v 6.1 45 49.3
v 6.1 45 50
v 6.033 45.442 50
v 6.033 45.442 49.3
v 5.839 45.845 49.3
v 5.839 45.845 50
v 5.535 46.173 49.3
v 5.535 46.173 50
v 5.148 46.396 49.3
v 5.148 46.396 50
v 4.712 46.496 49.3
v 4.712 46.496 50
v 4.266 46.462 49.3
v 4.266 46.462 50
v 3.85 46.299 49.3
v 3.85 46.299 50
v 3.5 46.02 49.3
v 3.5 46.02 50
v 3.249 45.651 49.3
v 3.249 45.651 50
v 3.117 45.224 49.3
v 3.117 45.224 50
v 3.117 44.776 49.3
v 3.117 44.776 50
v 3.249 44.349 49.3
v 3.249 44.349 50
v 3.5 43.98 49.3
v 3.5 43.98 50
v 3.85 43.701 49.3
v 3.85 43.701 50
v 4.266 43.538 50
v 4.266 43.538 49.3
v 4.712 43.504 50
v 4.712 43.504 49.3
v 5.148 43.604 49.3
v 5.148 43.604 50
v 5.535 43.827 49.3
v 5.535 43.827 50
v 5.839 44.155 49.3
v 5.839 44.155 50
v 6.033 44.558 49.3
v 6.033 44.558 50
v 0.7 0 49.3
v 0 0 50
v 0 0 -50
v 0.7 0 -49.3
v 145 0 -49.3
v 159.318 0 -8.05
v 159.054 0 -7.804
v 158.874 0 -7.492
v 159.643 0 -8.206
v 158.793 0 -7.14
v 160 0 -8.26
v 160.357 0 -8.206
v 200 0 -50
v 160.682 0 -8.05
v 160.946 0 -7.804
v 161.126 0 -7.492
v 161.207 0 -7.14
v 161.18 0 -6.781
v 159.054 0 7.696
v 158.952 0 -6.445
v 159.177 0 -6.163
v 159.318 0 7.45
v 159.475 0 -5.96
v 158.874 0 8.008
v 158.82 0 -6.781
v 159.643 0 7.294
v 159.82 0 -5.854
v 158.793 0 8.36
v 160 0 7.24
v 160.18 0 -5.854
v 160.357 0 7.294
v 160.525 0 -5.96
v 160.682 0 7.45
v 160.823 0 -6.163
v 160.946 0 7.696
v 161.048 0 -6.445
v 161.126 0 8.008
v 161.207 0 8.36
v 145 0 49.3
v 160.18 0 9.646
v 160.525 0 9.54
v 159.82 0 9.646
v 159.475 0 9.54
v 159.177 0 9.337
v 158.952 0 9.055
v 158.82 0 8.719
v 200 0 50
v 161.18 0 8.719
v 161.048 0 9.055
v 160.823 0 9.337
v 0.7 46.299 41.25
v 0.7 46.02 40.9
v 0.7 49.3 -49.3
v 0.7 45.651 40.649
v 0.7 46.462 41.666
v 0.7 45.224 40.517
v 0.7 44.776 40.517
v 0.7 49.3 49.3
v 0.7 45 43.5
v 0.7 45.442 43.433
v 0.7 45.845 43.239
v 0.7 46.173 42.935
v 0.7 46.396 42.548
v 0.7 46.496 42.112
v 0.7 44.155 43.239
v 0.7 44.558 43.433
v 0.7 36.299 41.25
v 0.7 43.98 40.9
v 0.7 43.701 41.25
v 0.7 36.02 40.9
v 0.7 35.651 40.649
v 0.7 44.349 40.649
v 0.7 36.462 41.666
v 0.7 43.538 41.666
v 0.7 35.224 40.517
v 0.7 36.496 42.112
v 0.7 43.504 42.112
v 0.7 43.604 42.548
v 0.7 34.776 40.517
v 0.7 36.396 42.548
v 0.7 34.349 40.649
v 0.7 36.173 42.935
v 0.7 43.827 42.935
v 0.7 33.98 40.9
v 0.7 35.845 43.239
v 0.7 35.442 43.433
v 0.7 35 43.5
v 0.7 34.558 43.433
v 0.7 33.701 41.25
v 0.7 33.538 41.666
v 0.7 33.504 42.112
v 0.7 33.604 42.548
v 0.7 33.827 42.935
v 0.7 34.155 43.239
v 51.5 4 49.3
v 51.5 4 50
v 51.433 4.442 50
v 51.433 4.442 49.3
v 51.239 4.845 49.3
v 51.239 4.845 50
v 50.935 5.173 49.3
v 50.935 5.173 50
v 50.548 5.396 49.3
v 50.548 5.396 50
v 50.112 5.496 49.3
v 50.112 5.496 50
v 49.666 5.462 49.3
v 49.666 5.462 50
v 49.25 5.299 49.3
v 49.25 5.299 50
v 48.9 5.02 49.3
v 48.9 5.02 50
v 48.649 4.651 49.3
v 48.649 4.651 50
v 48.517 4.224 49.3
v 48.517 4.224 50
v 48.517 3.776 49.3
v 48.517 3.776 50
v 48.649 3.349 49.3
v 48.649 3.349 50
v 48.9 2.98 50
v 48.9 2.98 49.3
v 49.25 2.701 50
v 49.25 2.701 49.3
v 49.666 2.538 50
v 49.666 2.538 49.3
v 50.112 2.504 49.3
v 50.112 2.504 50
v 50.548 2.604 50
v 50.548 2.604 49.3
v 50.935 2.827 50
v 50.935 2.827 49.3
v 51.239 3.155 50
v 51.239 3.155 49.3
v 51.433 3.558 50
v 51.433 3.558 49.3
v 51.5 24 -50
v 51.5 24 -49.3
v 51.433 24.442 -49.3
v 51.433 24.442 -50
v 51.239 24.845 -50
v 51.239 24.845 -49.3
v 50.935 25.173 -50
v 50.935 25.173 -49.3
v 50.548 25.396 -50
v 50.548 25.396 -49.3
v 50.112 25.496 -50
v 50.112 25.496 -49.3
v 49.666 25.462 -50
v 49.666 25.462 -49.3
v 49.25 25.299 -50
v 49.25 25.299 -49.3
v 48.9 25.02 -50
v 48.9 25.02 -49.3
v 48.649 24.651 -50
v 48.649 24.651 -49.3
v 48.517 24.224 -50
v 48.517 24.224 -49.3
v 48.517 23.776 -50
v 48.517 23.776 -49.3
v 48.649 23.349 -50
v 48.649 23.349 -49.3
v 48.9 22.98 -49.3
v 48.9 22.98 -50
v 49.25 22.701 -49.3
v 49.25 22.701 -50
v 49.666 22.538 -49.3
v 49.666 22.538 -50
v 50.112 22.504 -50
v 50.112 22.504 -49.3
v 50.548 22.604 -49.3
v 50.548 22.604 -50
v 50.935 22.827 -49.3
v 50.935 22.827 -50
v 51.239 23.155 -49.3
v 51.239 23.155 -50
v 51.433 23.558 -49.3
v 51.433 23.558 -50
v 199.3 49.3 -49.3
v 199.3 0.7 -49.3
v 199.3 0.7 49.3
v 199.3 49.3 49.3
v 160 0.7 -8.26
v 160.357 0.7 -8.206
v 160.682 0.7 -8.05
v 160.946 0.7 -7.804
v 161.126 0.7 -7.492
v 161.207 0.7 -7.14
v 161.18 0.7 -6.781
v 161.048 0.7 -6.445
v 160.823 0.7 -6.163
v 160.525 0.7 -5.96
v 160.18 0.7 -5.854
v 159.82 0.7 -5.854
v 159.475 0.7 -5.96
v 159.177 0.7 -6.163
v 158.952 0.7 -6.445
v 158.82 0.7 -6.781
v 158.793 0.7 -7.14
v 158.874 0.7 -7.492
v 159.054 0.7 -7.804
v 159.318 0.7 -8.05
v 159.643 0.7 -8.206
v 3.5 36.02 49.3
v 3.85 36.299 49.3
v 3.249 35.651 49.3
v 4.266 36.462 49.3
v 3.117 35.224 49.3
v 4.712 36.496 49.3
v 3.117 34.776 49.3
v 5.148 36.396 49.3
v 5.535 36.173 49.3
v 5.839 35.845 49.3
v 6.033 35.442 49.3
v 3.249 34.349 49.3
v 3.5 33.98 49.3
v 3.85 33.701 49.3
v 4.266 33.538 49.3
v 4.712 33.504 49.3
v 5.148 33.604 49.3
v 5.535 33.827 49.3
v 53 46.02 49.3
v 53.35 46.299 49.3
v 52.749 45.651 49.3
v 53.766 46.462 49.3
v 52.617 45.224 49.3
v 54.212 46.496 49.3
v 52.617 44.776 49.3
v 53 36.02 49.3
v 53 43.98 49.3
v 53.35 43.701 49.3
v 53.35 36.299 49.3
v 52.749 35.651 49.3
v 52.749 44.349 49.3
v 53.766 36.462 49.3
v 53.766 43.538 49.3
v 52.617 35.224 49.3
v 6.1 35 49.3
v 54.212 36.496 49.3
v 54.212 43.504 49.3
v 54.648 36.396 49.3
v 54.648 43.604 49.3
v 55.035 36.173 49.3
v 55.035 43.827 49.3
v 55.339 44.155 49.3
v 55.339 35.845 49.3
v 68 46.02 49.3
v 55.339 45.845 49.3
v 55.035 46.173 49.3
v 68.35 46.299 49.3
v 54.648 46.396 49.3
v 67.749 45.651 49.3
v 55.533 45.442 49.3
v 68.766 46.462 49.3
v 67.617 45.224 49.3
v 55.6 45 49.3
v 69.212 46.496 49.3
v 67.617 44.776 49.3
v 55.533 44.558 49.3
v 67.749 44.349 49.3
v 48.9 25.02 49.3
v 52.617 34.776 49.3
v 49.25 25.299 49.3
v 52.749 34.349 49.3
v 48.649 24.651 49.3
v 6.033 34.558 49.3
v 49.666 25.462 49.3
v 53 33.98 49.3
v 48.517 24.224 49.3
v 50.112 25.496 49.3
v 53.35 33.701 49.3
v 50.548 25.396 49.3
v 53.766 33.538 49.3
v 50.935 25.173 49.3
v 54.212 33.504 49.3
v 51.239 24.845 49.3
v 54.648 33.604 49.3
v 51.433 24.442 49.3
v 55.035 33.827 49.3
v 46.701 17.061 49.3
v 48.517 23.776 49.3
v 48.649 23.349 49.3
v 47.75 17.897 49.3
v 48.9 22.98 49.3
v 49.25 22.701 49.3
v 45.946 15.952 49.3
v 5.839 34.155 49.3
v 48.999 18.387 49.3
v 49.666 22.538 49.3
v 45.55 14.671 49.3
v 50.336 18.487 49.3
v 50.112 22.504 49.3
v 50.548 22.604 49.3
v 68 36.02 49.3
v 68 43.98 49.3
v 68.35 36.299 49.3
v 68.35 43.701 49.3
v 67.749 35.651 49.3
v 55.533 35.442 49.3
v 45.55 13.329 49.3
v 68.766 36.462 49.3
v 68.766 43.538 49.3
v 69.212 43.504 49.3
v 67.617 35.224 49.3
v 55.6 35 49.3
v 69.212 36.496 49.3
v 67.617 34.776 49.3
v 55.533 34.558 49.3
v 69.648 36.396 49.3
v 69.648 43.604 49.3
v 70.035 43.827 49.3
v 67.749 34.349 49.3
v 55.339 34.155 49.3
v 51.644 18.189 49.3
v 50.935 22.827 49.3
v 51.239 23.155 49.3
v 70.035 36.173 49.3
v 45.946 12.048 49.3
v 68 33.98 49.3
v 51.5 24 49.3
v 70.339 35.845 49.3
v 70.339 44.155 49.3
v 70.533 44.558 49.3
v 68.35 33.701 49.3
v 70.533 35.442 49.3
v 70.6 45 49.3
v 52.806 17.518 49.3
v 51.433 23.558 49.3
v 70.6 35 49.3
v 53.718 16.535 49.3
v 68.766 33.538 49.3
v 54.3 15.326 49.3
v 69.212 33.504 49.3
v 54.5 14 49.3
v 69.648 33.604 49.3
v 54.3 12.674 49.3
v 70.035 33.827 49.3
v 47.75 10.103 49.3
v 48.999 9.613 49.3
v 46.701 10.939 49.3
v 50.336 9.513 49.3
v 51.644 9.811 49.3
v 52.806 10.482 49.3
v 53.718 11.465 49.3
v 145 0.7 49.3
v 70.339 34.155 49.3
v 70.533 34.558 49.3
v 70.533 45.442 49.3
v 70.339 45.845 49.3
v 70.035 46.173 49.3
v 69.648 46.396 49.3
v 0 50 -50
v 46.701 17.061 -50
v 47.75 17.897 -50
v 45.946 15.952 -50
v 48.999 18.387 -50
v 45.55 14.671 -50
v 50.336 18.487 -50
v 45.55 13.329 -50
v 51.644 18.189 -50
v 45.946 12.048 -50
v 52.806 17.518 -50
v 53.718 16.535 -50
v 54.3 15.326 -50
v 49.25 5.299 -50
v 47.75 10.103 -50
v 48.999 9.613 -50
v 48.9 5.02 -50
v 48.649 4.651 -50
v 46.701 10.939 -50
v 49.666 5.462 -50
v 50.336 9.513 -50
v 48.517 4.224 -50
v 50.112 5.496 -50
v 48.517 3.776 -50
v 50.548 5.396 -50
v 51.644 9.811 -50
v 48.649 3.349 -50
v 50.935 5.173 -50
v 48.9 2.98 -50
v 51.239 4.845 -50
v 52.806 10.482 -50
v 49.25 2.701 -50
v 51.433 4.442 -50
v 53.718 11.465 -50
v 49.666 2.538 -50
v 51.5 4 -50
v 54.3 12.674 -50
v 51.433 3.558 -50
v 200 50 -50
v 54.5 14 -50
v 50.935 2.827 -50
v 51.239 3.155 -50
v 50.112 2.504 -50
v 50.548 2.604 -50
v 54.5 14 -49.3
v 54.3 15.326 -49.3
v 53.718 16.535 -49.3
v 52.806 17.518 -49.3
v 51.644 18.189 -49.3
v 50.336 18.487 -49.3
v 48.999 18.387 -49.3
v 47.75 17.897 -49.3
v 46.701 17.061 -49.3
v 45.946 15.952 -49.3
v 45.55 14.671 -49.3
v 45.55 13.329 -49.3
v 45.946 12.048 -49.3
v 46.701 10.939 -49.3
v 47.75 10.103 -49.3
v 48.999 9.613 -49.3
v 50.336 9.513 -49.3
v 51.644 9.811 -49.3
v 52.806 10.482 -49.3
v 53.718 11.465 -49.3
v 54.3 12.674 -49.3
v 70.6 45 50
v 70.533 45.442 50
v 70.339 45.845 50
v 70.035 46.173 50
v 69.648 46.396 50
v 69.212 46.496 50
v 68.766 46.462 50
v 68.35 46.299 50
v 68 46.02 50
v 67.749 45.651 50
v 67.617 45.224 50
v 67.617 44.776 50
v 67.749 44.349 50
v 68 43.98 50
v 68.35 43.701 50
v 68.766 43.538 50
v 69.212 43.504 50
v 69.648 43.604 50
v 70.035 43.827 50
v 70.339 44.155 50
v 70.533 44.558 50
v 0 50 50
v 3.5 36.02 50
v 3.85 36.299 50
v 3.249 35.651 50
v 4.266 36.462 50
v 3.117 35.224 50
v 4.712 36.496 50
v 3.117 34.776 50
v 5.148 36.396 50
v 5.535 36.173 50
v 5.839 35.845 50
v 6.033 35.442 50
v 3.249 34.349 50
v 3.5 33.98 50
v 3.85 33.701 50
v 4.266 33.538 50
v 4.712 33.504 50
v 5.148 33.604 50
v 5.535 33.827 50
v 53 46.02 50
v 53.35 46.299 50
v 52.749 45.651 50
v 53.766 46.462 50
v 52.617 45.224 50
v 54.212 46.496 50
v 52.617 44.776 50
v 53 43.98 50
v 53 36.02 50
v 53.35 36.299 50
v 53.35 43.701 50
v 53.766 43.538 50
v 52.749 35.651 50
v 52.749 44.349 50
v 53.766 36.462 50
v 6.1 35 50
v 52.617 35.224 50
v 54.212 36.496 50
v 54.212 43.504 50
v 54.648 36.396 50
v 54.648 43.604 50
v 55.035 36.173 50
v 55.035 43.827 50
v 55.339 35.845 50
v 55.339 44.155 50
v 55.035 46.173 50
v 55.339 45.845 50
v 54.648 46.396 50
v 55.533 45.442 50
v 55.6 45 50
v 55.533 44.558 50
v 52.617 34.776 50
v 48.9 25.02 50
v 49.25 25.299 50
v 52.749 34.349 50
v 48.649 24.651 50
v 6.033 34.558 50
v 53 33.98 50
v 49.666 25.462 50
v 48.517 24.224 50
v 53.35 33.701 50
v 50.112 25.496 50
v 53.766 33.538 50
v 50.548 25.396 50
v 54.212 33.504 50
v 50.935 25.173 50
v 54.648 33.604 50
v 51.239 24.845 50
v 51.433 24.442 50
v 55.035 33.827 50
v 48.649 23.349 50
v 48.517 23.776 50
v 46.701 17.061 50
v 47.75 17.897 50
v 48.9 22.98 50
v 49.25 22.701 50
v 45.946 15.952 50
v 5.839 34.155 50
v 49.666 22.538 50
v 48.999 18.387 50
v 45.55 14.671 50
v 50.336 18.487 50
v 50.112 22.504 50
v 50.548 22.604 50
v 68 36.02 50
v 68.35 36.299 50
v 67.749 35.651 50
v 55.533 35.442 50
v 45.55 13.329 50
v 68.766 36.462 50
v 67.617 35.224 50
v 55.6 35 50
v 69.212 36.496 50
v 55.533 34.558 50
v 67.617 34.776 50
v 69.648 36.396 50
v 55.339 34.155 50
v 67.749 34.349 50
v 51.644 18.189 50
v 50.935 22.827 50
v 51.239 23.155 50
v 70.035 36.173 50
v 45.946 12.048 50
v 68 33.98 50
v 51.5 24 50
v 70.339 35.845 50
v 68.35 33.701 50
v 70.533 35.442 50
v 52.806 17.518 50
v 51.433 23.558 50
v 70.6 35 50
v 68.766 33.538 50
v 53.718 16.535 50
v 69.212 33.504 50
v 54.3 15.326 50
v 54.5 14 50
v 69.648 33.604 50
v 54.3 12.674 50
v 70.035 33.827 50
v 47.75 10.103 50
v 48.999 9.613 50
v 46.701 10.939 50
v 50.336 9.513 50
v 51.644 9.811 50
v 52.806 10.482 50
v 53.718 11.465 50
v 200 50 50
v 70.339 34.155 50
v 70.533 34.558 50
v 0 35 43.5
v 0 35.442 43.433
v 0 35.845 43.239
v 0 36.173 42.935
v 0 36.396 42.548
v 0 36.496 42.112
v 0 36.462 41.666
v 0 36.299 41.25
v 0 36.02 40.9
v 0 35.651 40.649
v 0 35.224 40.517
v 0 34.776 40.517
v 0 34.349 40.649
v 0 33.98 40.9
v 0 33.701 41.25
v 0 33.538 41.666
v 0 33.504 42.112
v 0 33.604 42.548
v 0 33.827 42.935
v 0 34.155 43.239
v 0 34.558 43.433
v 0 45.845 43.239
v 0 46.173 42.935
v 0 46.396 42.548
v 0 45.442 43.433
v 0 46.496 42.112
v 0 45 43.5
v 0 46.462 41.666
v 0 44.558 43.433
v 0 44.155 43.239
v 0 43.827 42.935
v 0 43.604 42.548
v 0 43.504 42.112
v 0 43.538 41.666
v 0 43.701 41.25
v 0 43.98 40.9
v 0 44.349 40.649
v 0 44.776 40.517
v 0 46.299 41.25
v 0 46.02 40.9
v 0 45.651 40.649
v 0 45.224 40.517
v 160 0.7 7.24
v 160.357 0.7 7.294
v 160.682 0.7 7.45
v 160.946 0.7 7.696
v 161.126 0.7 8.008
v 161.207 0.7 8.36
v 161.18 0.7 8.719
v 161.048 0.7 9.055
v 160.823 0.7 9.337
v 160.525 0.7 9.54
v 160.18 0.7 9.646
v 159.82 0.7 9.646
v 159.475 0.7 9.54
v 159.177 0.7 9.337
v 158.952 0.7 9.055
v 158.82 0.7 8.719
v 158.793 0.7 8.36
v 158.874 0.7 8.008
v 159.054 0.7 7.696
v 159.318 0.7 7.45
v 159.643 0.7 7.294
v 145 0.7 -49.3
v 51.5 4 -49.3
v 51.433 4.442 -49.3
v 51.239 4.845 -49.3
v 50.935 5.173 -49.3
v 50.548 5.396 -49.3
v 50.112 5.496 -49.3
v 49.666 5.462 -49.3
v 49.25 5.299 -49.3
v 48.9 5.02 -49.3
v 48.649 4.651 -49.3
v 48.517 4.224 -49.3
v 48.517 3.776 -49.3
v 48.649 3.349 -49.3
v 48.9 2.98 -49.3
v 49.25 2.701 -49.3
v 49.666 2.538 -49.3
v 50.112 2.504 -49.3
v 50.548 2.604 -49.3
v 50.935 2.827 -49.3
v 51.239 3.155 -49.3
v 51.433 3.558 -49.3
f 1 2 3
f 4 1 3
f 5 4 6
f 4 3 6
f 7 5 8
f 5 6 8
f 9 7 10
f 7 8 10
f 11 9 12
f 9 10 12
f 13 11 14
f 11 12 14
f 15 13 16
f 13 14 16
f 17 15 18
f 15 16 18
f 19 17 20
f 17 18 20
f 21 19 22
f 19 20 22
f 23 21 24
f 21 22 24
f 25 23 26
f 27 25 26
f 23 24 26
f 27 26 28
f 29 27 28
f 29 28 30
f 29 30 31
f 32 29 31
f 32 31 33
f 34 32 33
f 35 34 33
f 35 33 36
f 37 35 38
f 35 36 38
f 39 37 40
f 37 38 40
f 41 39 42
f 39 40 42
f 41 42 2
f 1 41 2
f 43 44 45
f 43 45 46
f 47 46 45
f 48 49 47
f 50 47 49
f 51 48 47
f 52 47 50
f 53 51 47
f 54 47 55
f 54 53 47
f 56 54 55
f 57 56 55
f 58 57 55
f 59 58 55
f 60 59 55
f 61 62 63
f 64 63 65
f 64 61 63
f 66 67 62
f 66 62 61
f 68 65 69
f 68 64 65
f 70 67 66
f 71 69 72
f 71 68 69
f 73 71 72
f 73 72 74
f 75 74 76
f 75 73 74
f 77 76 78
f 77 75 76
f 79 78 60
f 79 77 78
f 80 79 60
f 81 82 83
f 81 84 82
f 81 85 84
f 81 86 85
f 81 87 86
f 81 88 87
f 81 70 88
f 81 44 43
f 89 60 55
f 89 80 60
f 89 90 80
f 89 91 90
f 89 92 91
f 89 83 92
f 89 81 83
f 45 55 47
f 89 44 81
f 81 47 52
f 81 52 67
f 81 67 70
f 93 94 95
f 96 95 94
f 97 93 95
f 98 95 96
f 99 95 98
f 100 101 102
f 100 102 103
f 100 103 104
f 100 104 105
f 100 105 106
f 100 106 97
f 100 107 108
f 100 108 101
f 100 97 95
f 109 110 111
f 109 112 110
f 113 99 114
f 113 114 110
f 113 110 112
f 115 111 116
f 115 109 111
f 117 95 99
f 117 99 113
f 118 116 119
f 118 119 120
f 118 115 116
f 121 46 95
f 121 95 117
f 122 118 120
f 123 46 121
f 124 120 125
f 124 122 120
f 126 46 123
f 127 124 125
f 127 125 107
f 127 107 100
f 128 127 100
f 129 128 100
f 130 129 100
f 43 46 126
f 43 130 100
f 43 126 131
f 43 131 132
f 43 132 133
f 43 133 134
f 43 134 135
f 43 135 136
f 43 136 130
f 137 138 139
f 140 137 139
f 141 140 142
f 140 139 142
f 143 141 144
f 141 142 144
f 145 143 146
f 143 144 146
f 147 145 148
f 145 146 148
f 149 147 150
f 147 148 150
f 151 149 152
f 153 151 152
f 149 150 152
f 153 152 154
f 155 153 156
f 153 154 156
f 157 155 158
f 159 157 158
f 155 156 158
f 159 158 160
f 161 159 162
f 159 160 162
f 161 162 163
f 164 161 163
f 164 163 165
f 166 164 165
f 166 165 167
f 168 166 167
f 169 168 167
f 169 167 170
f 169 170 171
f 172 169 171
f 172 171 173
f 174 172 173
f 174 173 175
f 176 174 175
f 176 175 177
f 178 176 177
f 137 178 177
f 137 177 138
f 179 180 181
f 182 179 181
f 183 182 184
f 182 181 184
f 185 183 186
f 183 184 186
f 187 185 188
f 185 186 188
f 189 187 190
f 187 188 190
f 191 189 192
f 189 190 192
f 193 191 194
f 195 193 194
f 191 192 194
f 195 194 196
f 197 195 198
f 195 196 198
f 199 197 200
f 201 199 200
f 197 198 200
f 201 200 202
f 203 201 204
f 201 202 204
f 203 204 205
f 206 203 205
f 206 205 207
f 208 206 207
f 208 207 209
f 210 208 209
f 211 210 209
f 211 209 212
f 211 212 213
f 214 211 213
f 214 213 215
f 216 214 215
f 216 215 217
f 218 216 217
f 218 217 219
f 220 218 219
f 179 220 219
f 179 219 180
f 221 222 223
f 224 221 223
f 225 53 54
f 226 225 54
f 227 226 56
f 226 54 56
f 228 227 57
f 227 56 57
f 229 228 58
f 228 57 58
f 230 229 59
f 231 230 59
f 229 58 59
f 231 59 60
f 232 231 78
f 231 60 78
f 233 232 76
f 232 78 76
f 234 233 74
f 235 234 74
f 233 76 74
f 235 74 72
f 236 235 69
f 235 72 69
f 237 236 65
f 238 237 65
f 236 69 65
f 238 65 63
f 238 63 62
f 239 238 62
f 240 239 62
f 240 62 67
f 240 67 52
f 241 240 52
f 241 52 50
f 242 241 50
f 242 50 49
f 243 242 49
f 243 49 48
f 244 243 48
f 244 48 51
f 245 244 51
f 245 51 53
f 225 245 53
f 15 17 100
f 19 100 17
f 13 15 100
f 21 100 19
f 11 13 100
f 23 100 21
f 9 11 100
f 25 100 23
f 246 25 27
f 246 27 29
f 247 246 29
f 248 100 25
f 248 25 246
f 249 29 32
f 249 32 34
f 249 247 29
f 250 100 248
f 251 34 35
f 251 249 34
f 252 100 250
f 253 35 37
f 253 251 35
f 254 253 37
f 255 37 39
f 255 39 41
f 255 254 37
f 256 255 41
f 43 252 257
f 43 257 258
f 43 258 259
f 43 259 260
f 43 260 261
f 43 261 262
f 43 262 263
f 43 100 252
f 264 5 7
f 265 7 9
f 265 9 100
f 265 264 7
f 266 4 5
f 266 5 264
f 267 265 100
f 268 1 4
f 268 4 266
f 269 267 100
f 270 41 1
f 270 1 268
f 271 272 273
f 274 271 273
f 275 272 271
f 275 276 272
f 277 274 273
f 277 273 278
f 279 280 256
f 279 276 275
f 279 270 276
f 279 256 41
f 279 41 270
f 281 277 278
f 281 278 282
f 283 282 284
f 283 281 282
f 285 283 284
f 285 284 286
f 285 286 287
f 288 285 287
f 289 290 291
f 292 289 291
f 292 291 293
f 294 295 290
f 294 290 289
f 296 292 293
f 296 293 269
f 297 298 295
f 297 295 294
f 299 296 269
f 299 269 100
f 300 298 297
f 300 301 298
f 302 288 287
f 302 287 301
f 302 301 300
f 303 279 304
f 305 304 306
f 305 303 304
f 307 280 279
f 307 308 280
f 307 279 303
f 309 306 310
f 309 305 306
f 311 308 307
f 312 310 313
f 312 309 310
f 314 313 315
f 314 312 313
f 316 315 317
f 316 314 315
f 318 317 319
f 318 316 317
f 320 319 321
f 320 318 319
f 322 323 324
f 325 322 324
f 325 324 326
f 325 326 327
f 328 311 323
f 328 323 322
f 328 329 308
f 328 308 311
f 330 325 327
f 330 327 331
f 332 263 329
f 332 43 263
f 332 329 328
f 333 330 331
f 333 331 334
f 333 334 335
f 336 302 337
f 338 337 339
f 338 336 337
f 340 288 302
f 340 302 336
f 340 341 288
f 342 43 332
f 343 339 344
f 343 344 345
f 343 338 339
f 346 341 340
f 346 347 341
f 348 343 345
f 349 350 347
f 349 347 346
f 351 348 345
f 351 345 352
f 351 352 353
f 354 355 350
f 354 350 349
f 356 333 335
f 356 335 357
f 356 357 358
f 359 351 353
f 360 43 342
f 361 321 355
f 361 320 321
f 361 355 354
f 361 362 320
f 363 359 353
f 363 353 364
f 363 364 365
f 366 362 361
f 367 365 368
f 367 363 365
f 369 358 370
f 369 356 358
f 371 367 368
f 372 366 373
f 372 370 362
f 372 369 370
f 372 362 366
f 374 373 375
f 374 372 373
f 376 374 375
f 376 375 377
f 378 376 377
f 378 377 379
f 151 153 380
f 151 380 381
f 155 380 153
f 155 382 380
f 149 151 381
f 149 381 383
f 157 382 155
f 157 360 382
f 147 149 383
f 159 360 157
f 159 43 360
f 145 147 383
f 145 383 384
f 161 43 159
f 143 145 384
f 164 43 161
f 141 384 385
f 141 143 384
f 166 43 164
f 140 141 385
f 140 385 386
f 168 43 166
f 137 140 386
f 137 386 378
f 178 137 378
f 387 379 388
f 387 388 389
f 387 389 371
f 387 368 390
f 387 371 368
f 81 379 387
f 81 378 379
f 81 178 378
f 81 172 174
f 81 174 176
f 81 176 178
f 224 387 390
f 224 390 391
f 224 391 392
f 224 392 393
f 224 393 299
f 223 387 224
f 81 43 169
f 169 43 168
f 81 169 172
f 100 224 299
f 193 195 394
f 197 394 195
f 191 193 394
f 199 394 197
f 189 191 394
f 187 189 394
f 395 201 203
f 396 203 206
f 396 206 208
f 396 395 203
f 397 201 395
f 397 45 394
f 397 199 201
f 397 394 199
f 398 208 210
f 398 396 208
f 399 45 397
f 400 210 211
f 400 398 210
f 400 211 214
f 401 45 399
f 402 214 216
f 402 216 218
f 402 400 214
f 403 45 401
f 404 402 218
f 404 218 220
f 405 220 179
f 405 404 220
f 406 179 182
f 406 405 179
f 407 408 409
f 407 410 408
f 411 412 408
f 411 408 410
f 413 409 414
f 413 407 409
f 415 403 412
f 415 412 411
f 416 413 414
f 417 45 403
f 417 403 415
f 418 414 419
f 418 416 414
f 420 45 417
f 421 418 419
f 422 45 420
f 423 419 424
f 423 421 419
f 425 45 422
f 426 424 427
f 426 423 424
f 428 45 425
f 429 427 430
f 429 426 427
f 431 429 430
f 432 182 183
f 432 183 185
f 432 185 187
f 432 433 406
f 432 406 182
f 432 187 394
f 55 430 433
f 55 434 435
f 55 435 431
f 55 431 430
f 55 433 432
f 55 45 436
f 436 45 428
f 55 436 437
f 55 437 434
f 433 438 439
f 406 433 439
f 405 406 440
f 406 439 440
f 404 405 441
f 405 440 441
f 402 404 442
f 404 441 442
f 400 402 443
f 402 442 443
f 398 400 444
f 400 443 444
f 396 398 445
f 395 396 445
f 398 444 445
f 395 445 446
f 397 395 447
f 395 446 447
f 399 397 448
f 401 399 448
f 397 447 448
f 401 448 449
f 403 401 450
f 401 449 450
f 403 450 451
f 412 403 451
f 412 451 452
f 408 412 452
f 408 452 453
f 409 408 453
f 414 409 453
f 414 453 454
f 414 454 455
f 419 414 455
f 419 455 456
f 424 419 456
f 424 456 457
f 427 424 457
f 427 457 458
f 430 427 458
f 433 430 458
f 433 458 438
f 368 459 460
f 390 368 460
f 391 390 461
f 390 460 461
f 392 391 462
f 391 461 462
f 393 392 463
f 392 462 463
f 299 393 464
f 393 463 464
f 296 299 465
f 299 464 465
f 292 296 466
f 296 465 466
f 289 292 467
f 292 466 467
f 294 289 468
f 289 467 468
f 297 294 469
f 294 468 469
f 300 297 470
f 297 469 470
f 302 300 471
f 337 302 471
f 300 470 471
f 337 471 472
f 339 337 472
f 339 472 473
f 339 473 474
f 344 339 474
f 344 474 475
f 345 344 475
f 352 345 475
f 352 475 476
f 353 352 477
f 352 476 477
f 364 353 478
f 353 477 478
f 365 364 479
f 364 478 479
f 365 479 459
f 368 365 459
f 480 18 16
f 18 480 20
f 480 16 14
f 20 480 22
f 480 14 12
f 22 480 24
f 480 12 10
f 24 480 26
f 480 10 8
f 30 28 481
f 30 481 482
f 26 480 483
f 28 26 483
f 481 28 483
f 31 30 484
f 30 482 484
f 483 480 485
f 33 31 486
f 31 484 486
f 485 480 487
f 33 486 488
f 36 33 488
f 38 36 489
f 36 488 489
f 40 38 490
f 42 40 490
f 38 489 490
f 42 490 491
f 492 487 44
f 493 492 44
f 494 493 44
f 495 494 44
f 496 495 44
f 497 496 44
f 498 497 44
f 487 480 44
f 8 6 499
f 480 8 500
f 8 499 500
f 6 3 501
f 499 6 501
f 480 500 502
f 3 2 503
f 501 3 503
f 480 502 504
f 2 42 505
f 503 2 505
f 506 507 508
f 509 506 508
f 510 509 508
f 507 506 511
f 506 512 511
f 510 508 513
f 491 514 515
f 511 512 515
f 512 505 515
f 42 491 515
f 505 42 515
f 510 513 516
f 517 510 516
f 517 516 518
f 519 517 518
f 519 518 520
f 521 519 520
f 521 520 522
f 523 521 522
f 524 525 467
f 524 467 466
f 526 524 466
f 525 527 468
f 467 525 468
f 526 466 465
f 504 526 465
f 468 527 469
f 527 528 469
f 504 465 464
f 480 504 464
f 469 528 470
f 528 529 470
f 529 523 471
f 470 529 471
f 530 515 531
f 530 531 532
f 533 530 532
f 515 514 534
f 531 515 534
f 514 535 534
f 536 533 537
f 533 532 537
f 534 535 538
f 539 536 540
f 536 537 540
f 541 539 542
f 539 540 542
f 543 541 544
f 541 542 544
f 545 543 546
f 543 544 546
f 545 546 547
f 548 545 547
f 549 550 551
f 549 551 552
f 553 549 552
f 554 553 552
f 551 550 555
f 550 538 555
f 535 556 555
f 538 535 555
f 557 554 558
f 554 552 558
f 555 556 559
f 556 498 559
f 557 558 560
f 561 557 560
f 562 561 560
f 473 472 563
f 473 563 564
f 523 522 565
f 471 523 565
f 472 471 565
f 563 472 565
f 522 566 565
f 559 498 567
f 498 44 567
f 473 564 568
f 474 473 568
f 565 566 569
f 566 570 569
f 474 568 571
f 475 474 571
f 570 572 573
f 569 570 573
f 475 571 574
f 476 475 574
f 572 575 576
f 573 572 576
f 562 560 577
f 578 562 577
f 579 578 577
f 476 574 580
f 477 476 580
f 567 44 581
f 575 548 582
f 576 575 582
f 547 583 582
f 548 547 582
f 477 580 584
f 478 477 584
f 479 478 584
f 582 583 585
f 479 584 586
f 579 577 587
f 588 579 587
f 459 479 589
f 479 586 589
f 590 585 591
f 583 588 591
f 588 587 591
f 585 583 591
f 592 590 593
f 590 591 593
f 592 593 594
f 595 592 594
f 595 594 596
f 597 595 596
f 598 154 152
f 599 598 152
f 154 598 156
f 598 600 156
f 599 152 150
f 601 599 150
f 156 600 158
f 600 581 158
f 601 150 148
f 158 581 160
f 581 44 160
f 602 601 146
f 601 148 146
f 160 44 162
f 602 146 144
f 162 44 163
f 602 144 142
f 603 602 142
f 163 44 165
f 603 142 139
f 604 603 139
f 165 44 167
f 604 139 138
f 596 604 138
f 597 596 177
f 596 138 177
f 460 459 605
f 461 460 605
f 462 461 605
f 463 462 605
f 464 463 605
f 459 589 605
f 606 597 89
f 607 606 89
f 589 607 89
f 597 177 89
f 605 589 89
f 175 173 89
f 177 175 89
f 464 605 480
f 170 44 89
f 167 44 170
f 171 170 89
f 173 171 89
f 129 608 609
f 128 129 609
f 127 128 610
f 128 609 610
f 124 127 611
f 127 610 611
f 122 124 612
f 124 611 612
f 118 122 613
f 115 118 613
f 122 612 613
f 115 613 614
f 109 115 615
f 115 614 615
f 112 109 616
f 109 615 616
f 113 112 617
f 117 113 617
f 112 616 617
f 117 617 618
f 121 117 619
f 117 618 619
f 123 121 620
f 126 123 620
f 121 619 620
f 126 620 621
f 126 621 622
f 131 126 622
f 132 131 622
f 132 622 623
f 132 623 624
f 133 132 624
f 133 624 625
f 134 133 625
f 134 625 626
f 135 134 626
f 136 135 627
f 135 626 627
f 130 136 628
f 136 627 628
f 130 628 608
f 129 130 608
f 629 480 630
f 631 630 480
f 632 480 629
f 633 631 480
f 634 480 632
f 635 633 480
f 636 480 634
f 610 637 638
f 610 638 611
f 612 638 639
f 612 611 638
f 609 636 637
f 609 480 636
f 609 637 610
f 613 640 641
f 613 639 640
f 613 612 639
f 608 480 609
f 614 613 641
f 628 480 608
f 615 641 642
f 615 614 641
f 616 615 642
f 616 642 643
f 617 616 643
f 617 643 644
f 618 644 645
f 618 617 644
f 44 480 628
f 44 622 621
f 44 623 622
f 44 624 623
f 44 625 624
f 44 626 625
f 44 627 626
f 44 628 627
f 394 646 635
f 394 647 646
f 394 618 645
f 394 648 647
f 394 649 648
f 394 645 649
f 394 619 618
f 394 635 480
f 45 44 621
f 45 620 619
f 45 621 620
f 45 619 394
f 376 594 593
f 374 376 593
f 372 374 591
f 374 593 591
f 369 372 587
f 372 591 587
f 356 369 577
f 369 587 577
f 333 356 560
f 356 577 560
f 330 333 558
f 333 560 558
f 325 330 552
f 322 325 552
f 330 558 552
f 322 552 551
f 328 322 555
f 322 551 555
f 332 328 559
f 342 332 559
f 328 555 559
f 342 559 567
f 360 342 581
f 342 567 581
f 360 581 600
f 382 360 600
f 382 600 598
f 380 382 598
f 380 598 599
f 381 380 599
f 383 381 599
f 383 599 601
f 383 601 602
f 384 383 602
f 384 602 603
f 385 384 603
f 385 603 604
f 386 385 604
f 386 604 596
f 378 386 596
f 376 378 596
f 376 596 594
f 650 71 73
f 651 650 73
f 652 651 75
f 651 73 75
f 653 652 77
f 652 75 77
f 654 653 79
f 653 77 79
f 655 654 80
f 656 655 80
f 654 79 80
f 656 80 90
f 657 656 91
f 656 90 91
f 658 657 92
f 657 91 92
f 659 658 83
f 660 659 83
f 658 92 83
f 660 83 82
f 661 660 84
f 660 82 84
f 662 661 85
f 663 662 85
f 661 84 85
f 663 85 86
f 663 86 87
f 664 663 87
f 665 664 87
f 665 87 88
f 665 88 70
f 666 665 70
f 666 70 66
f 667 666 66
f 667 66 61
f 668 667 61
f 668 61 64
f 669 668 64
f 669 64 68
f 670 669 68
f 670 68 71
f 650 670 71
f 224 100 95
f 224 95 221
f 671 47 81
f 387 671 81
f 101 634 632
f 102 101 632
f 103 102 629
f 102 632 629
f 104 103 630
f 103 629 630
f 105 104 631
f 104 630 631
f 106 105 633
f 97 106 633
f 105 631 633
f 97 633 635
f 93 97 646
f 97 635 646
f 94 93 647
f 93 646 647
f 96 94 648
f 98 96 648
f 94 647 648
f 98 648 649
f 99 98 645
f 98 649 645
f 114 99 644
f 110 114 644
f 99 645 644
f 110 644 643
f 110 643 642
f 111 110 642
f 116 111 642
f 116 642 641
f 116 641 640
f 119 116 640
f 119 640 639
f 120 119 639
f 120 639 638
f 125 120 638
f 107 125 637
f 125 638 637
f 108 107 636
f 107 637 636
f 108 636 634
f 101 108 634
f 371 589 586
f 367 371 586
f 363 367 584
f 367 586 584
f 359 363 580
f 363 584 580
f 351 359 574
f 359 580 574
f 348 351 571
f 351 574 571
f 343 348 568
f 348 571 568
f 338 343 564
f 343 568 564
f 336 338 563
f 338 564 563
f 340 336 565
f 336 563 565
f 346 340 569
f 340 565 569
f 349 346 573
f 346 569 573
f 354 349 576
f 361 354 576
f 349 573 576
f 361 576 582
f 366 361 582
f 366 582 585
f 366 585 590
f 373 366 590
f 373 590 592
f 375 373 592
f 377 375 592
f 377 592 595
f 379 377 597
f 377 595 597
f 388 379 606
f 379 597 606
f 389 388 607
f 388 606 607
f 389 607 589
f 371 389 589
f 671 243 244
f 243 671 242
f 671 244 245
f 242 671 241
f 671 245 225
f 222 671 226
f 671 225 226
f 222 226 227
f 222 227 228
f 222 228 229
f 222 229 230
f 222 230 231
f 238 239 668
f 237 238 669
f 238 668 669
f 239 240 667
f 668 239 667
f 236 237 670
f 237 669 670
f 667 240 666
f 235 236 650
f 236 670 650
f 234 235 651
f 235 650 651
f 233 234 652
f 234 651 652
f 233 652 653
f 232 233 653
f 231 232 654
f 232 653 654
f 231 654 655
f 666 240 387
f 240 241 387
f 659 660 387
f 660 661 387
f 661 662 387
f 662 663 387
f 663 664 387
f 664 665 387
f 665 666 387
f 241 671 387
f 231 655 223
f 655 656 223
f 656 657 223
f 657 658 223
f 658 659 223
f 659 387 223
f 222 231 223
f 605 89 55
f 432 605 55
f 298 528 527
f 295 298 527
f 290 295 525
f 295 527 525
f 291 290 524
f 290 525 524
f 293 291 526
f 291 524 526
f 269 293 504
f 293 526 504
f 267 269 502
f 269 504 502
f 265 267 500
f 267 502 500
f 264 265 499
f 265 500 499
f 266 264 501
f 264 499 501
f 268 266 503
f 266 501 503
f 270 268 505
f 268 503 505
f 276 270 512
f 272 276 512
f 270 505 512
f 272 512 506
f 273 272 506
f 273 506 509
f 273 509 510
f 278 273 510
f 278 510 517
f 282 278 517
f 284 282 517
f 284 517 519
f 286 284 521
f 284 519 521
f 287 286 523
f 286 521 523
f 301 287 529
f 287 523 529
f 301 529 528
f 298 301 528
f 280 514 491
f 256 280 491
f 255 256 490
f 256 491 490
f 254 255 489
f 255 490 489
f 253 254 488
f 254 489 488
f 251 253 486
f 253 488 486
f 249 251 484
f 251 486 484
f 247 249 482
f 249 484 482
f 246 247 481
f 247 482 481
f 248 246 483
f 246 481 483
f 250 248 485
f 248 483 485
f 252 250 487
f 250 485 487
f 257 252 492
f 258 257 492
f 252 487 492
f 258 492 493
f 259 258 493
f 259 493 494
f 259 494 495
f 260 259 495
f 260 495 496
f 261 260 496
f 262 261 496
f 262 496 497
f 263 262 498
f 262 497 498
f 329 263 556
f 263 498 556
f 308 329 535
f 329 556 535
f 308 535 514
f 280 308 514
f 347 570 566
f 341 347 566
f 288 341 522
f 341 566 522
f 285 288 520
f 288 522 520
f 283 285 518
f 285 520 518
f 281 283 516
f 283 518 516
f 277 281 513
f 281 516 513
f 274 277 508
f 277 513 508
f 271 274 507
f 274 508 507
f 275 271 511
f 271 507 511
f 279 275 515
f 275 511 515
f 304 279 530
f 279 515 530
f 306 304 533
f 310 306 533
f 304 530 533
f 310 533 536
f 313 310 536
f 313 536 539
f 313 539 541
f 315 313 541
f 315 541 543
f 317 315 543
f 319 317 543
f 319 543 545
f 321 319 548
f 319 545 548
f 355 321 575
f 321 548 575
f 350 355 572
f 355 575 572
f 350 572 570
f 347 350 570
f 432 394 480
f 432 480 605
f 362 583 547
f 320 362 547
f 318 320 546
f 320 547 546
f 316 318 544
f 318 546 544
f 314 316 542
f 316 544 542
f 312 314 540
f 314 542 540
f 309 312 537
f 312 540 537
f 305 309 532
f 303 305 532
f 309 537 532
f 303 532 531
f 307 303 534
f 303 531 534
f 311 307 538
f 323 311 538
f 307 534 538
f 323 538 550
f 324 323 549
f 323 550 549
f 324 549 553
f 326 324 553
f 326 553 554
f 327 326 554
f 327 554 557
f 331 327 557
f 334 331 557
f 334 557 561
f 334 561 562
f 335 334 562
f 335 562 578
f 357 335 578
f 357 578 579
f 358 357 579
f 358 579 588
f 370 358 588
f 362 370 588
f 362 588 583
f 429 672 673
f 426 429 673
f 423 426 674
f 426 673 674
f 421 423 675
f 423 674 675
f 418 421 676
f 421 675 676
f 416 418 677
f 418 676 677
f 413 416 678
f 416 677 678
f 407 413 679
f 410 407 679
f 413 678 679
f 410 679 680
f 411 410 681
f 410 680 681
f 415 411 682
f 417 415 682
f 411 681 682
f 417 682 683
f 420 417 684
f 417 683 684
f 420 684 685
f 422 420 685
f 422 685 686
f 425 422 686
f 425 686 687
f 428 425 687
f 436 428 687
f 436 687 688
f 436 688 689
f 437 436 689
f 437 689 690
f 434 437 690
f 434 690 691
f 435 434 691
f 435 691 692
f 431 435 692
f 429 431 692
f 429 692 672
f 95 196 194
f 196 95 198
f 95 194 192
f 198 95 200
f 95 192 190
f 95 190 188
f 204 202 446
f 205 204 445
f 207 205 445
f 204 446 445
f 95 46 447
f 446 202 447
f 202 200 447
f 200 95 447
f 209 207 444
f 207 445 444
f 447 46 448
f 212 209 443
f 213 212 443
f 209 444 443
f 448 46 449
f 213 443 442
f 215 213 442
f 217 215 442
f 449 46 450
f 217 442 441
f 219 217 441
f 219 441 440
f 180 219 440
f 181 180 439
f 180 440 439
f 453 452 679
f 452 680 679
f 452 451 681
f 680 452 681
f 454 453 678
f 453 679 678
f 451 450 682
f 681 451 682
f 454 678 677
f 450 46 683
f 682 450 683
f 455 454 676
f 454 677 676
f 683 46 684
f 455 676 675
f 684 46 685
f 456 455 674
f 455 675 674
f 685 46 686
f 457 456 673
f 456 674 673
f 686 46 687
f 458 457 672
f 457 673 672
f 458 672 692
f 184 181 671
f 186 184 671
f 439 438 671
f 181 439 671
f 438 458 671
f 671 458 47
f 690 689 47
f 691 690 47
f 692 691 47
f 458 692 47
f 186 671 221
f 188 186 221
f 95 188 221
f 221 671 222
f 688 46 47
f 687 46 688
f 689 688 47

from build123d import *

# Parameters (mm, degrees)
SKETCH1_W           = 200
SKETCH1_H           = 100
BOSS_EXTRUDE1_DEPTH = 50
SKETCH3_W           = 198.6
SKETCH3_H           = 98.6
CUT_EXTRUDE1_DEPTH  = 49.3
SKETCH4_W           = 54.3
SKETCH4_H           = 98.6
BOSS_EXTRUDE2_DEPTH = 0.7
SKETCH2_R           = 4.5
SKETCH2_R_2         = 1.5
CUT_EXTRUDE2_DEPTH  = 230.128784748
SKETCH6_R           = 1.5
CUT_EXTRUDE3_DEPTH  = 0.7
SKETCH7_R           = 1.5
CUT_EXTRUDE4_DEPTH  = 0.7
CUT_EXTRUDE6_REACH  = 214.132
SKETCH8_R           = 1.21


with BuildPart() as part:
    # Sketch1 → Boss-Extrude1 (new body)
    with BuildSketch(Plane(origin=(0, 0, 0), x_dir=(1, 0, 0), z_dir=(0, 1, 0))):
        with Locations((100, 0)):
            Rectangle(SKETCH1_W, SKETCH1_H)
    extrude(amount=BOSS_EXTRUDE1_DEPTH)

    # Sketch3 → Cut-Extrude1 (cut)
    with BuildSketch(Plane.XZ):
        with Locations((100, 0)):
            Rectangle(SKETCH3_W, SKETCH3_H)
    extrude(amount=-CUT_EXTRUDE1_DEPTH, mode=Mode.SUBTRACT)

    # Sketch4 → Boss-Extrude2 (add)
    with BuildSketch(Plane.XZ):
        with Locations((172.15, 0)):
            Rectangle(SKETCH4_W, SKETCH4_H)
    extrude(amount=-BOSS_EXTRUDE2_DEPTH)

    # Sketch2 → Cut-Extrude2 (cut, through all)
    with BuildSketch(Plane.XY.offset(50)):
        with Locations((50, 14)):
            Circle(SKETCH2_R)
        with Locations((50, 4)):
            Circle(SKETCH2_R_2)
        with Locations((50, 24)):
            Circle(SKETCH2_R_2)
    extrude(amount=-CUT_EXTRUDE2_DEPTH, mode=Mode.SUBTRACT)

    # Sketch6 → Cut-Extrude3 (cut)
    with BuildSketch(Plane.XY.offset(50)):
        with Locations((4.6, 45)):
            Circle(SKETCH6_R)
        with Locations((4.6, 35)):
            Circle(SKETCH6_R)
        with Locations((54.1, 45)):
            Circle(SKETCH6_R)
        with Locations((54.1, 35)):
            Circle(SKETCH6_R)
        with Locations((69.1, 45)):
            Circle(SKETCH6_R)
        with Locations((69.1, 35)):
            Circle(SKETCH6_R)
    extrude(amount=-CUT_EXTRUDE3_DEPTH, mode=Mode.SUBTRACT)

    # Sketch7 → Cut-Extrude4 (cut)
    with BuildSketch(Plane.ZY):
        with Locations((42, 45)):
            Circle(SKETCH7_R)
        with Locations((42, 35)):
            Circle(SKETCH7_R)
    extrude(amount=-CUT_EXTRUDE4_DEPTH, mode=Mode.SUBTRACT)

    # Sketch8 → Cut-Extrude6 (cut, up to next)
    with BuildSketch(Plane.XZ, mode=Mode.PRIVATE) as cut_extrude6_sk1:
        with Locations(Location((160, 8.45, 0), (0, 0, 270))):
            Circle(SKETCH8_R)
    cut_extrude6_tool1 = extrude(cut_extrude6_sk1.sketch, amount=-CUT_EXTRUDE6_REACH, mode=Mode.PRIVATE) & part.part
    # Sketch8 → Cut-Extrude6 (cut, up to next)
    with BuildSketch(Plane.XZ, mode=Mode.PRIVATE) as cut_extrude6_sk2:
        with Locations(Location((160, -7.05, 0), (0, 0, 270))):
            Circle(SKETCH8_R)
    cut_extrude6_tool2 = extrude(cut_extrude6_sk2.sketch, amount=-CUT_EXTRUDE6_REACH, mode=Mode.PRIVATE) & part.part
    add(cut_extrude6_tool1.solids().sort_by_distance((160, 0, 8.45))[0], mode=Mode.SUBTRACT)
    add(cut_extrude6_tool2.solids().sort_by_distance((160, 0, -7.05))[0], mode=Mode.SUBTRACT)


solid = part.part
